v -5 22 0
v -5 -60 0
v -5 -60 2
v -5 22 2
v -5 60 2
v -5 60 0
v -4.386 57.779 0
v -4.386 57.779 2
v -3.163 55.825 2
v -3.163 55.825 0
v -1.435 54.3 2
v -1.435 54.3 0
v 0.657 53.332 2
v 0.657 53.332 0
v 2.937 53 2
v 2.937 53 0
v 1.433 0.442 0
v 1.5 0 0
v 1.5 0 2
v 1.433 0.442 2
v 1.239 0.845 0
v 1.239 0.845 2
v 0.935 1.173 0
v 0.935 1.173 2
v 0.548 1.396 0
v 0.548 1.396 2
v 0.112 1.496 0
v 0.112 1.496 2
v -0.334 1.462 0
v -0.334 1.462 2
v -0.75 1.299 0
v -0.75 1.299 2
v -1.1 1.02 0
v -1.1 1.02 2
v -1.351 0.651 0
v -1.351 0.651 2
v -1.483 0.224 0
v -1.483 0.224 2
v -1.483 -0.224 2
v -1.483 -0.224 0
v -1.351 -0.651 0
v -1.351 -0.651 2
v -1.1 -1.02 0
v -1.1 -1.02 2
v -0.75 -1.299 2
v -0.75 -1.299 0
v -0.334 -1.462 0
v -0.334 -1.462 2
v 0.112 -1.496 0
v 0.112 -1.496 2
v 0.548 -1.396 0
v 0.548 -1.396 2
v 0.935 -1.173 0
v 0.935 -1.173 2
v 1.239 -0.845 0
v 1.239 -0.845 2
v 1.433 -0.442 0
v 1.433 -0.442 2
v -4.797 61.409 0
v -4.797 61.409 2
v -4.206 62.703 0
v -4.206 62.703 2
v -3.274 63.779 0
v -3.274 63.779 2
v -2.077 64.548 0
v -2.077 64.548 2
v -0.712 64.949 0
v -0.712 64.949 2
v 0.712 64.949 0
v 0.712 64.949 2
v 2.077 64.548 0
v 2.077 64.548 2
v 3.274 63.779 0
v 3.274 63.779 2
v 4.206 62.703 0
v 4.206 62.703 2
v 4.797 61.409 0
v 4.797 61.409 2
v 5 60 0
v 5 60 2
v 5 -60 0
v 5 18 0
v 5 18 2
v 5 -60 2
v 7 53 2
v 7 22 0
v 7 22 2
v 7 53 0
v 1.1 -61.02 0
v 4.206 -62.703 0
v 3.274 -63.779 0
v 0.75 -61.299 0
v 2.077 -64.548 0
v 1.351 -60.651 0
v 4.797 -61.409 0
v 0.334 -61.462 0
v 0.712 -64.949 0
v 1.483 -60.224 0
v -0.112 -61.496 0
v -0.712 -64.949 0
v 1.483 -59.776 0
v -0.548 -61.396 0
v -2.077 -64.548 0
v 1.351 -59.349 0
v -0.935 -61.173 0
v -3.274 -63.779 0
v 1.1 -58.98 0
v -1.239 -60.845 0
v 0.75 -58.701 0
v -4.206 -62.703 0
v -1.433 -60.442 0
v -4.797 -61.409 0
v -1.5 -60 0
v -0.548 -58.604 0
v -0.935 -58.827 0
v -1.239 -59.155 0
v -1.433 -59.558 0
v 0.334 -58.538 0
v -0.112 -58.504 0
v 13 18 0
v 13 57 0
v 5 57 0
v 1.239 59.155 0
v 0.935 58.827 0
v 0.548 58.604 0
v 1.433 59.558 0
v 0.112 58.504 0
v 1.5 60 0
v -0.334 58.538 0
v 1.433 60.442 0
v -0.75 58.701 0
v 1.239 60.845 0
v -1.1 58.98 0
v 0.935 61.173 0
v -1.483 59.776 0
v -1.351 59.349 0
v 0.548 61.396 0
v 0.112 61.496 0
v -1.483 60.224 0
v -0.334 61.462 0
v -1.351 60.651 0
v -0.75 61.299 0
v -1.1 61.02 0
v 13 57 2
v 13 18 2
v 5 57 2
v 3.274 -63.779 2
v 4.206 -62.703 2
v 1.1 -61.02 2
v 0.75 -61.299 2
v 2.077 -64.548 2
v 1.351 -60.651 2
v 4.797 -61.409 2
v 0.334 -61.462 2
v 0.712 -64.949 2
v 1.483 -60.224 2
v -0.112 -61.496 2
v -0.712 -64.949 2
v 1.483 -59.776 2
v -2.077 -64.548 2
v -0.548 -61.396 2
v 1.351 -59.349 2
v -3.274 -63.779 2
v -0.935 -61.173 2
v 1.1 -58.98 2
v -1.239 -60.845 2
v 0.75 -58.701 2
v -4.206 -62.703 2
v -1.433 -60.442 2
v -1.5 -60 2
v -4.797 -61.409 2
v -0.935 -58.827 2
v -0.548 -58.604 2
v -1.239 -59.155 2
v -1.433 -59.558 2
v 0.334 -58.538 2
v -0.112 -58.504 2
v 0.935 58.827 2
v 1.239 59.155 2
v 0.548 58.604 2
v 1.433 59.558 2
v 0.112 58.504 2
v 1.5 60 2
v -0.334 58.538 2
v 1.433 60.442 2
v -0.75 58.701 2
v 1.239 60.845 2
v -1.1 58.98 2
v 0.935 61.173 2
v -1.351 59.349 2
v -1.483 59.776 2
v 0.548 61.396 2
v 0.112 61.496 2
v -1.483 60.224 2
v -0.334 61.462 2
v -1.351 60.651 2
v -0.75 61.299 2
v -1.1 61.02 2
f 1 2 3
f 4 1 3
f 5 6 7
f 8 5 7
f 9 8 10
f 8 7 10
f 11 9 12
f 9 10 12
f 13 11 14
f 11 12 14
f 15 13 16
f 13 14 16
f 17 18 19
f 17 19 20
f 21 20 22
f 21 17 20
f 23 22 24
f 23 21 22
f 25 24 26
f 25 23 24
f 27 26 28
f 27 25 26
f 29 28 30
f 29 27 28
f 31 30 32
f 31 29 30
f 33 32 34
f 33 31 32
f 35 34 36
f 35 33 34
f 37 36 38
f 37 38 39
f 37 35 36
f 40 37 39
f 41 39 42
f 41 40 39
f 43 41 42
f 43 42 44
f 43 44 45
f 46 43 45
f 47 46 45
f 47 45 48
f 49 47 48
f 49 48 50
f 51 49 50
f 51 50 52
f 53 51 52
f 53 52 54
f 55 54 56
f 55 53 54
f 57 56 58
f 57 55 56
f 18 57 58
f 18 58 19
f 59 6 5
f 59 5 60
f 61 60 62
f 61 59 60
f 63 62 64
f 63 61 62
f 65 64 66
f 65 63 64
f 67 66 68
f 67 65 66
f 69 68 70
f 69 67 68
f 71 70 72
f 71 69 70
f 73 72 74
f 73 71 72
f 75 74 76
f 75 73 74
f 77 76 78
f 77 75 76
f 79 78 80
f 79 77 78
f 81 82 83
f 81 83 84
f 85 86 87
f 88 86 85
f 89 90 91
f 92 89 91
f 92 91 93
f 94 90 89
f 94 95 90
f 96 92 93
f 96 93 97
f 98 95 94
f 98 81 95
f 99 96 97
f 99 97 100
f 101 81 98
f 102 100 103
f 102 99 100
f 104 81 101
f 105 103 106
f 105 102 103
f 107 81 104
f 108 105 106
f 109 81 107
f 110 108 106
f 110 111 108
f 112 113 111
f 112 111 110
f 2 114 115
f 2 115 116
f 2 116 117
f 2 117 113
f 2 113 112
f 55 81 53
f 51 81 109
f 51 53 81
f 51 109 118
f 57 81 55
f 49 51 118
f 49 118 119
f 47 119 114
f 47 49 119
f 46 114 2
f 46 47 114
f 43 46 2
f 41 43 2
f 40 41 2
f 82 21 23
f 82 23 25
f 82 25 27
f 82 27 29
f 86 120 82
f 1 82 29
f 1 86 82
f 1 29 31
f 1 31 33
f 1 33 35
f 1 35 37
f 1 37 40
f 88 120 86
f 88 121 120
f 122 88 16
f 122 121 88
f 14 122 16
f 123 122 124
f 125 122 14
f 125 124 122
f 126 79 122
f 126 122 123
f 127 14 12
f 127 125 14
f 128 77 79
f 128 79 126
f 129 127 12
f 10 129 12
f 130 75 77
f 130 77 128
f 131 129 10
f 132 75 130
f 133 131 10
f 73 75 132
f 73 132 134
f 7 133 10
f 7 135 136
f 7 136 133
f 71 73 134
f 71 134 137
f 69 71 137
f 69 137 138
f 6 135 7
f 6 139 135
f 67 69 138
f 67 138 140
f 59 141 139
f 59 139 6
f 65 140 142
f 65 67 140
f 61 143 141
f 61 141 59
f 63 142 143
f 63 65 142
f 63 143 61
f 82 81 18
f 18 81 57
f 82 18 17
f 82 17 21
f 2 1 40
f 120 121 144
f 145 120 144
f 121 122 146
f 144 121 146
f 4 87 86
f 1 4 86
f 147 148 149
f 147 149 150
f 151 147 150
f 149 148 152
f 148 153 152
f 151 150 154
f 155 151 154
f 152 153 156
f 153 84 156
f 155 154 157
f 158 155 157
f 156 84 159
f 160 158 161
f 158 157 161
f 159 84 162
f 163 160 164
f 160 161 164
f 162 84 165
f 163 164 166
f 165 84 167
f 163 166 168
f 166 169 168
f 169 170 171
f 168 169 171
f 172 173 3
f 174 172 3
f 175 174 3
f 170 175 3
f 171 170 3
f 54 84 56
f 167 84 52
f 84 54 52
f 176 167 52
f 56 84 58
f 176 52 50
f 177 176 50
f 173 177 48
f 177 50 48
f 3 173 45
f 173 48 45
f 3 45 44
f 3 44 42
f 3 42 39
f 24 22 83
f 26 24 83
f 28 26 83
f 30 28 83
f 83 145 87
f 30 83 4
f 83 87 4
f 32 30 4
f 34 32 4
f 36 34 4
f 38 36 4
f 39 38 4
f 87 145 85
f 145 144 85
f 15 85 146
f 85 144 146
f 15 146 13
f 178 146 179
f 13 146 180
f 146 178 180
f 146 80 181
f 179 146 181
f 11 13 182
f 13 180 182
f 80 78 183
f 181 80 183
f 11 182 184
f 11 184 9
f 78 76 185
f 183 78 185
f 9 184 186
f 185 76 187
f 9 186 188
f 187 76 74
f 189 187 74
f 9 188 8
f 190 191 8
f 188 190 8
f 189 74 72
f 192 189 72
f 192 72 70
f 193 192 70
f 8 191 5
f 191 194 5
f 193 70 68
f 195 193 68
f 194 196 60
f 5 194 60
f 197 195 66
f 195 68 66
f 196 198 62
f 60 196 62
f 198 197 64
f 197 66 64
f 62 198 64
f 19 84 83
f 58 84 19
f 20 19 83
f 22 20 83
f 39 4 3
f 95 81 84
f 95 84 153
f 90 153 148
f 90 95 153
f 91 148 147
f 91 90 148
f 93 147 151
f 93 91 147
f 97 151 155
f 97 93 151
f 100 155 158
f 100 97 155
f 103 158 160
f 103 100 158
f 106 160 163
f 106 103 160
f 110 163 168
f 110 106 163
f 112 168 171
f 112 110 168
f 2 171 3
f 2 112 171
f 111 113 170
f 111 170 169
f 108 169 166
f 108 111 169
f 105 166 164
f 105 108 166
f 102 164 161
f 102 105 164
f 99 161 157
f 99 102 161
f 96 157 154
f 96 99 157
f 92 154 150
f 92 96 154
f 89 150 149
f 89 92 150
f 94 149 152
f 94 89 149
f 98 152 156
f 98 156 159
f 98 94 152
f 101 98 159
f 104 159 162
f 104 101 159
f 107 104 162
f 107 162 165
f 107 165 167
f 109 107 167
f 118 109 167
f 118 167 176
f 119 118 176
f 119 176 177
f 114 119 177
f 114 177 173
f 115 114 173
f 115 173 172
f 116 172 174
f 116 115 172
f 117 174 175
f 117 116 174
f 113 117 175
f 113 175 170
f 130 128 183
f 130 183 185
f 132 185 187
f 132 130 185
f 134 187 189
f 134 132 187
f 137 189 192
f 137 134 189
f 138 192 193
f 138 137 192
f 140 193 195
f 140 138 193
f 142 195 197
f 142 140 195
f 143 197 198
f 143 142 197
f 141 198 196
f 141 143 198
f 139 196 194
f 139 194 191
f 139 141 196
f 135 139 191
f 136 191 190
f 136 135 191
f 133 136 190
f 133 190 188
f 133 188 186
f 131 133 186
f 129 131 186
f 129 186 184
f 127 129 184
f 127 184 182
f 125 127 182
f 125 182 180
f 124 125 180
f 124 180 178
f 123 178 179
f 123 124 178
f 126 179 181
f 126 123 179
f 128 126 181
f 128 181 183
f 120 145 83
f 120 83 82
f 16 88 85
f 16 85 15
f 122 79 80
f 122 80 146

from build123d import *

# Parameters (mm, degrees)
SKETCH_1_R          = 1.5
EXTRUDE_1_DEPTH     = 2
SKETCH_2_W          = 2
SKETCH_2_H          = 4
EXTRUDE_5_DEPTH     = 18
SKETCH_5_W          = 3
SKETCH_5_H          = 2
EXTRUDE_6_DEPTH     = 35
SKETCH_7_W          = 2
SKETCH_7_H          = 4
EXTRUDE_9_DEPTH     = 8
SKETCH_9_W          = 10
SKETCH_9_H          = 31
CUT_EXTRUDE_2_DEPTH = 15
SKETCH_10_W         = 3
SKETCH_10_H         = 31
EXTRUDE_10_DEPTH    = 2
FILLET_1_R          = 8


with BuildPart() as part:
    # 草图1 → 凸台-拉伸1 (new body)
    with BuildSketch(Plane.XY):
        with BuildLine():
            Line((5, 60), (5, -60))
            ThreePointArc((5, -60), (0, -65), (-5, -60))
            Line((-5, -60), (-5, 60))
            ThreePointArc((-5, 60), (0, 65), (5, 60))
        make_face()
        with Locations((0, 60)):
            Circle(SKETCH_1_R, mode=Mode.SUBTRACT)
        with Locations(Location((0, -60, 0), (0, 0, 180))):
            Circle(SKETCH_1_R, mode=Mode.SUBTRACT)
        Circle(SKETCH_1_R, mode=Mode.SUBTRACT)
    extrude(amount=EXTRUDE_1_DEPTH)

    # 草图2 → 凸台-拉伸5 (add)
    with BuildSketch(Plane.ZY.offset(5)):
        with Locations((1, 55)):
            Rectangle(SKETCH_2_W, SKETCH_2_H)
    extrude(amount=-EXTRUDE_5_DEPTH)

    # 草图5 → 凸台-拉伸6 (add)
    with BuildSketch(Plane.XZ.offset(-53)):
        with Locations((11.5, 1)):
            Rectangle(SKETCH_5_W, SKETCH_5_H)
    extrude(amount=EXTRUDE_6_DEPTH)

    # 草图7 → 凸台-拉伸9 (add)
    with BuildSketch(Plane(origin=(13, 0, 0), x_dir=(0, 0, -1), z_dir=(1, 0, 0))):
        with Locations((-1, 20)):
            Rectangle(SKETCH_7_W, SKETCH_7_H)
    extrude(amount=-EXTRUDE_9_DEPTH)

    # 草图9 → 切除-拉伸2 (cut)
    with BuildSketch(Plane(origin=(0, 0, 0), x_dir=(-1, 0, 0), z_dir=(0, 0, -1))):
        with Locations((0, 37.5)):
            Rectangle(SKETCH_9_W, SKETCH_9_H)
    extrude(amount=-CUT_EXTRUDE_2_DEPTH, mode=Mode.SUBTRACT)

    # 草图10 → 凸台-拉伸10 (add)
    with BuildSketch(Plane(origin=(0, 0, 0), x_dir=(-1, 0, 0), z_dir=(0, 0, -1))):
        with Locations((-8.5, 37.5)):
            Rectangle(SKETCH_10_W, SKETCH_10_H)
    extrude(amount=-EXTRUDE_10_DEPTH)

    # 圆角1
    # the kernel refuses this fillet: 8 mm, written as the material it takes off along each edge
    with BuildSketch(Plane(origin=(-5, 53, -19.843134833), x_dir=(1, 0, 0), z_dir=(0, 0, 1))) as fillet_1_piece_1:
        with BuildLine():
            CenterArc((7.937253933, 8), FILLET_1_R, 187.180755781, 82.819244219)
            Line((0, 7), (0, 0))
            Line((0, 0), (7.937253933, 0))
        make_face()
    extrude(amount=41.686269666, mode=Mode.SUBTRACT)


solid = part.part
